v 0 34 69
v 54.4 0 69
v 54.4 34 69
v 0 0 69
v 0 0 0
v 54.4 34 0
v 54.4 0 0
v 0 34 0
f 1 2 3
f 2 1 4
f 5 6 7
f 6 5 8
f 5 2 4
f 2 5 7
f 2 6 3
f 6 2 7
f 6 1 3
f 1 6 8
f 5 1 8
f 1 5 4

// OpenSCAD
//-------------------------
//Kuechentuer
//-------------------------

//-------------------------
//Breite Türrahmen
btr=50.4;

//-------------------------
//Tiefe Türrahmen
ttr=13;

//-------------------------
//Tiefe Türangel
tta=19;

//-------------------------
//Höhe Türangel
hta=65;

//-------------------------
//Thickness
t=2.0;

//Breite Blende
bb=t+btr+t;
//Höhe Blende
hb=t+hta+t;
//Tiefe Blende
tb=t+tta+ttr;

cube([bb,tb,hb]);
